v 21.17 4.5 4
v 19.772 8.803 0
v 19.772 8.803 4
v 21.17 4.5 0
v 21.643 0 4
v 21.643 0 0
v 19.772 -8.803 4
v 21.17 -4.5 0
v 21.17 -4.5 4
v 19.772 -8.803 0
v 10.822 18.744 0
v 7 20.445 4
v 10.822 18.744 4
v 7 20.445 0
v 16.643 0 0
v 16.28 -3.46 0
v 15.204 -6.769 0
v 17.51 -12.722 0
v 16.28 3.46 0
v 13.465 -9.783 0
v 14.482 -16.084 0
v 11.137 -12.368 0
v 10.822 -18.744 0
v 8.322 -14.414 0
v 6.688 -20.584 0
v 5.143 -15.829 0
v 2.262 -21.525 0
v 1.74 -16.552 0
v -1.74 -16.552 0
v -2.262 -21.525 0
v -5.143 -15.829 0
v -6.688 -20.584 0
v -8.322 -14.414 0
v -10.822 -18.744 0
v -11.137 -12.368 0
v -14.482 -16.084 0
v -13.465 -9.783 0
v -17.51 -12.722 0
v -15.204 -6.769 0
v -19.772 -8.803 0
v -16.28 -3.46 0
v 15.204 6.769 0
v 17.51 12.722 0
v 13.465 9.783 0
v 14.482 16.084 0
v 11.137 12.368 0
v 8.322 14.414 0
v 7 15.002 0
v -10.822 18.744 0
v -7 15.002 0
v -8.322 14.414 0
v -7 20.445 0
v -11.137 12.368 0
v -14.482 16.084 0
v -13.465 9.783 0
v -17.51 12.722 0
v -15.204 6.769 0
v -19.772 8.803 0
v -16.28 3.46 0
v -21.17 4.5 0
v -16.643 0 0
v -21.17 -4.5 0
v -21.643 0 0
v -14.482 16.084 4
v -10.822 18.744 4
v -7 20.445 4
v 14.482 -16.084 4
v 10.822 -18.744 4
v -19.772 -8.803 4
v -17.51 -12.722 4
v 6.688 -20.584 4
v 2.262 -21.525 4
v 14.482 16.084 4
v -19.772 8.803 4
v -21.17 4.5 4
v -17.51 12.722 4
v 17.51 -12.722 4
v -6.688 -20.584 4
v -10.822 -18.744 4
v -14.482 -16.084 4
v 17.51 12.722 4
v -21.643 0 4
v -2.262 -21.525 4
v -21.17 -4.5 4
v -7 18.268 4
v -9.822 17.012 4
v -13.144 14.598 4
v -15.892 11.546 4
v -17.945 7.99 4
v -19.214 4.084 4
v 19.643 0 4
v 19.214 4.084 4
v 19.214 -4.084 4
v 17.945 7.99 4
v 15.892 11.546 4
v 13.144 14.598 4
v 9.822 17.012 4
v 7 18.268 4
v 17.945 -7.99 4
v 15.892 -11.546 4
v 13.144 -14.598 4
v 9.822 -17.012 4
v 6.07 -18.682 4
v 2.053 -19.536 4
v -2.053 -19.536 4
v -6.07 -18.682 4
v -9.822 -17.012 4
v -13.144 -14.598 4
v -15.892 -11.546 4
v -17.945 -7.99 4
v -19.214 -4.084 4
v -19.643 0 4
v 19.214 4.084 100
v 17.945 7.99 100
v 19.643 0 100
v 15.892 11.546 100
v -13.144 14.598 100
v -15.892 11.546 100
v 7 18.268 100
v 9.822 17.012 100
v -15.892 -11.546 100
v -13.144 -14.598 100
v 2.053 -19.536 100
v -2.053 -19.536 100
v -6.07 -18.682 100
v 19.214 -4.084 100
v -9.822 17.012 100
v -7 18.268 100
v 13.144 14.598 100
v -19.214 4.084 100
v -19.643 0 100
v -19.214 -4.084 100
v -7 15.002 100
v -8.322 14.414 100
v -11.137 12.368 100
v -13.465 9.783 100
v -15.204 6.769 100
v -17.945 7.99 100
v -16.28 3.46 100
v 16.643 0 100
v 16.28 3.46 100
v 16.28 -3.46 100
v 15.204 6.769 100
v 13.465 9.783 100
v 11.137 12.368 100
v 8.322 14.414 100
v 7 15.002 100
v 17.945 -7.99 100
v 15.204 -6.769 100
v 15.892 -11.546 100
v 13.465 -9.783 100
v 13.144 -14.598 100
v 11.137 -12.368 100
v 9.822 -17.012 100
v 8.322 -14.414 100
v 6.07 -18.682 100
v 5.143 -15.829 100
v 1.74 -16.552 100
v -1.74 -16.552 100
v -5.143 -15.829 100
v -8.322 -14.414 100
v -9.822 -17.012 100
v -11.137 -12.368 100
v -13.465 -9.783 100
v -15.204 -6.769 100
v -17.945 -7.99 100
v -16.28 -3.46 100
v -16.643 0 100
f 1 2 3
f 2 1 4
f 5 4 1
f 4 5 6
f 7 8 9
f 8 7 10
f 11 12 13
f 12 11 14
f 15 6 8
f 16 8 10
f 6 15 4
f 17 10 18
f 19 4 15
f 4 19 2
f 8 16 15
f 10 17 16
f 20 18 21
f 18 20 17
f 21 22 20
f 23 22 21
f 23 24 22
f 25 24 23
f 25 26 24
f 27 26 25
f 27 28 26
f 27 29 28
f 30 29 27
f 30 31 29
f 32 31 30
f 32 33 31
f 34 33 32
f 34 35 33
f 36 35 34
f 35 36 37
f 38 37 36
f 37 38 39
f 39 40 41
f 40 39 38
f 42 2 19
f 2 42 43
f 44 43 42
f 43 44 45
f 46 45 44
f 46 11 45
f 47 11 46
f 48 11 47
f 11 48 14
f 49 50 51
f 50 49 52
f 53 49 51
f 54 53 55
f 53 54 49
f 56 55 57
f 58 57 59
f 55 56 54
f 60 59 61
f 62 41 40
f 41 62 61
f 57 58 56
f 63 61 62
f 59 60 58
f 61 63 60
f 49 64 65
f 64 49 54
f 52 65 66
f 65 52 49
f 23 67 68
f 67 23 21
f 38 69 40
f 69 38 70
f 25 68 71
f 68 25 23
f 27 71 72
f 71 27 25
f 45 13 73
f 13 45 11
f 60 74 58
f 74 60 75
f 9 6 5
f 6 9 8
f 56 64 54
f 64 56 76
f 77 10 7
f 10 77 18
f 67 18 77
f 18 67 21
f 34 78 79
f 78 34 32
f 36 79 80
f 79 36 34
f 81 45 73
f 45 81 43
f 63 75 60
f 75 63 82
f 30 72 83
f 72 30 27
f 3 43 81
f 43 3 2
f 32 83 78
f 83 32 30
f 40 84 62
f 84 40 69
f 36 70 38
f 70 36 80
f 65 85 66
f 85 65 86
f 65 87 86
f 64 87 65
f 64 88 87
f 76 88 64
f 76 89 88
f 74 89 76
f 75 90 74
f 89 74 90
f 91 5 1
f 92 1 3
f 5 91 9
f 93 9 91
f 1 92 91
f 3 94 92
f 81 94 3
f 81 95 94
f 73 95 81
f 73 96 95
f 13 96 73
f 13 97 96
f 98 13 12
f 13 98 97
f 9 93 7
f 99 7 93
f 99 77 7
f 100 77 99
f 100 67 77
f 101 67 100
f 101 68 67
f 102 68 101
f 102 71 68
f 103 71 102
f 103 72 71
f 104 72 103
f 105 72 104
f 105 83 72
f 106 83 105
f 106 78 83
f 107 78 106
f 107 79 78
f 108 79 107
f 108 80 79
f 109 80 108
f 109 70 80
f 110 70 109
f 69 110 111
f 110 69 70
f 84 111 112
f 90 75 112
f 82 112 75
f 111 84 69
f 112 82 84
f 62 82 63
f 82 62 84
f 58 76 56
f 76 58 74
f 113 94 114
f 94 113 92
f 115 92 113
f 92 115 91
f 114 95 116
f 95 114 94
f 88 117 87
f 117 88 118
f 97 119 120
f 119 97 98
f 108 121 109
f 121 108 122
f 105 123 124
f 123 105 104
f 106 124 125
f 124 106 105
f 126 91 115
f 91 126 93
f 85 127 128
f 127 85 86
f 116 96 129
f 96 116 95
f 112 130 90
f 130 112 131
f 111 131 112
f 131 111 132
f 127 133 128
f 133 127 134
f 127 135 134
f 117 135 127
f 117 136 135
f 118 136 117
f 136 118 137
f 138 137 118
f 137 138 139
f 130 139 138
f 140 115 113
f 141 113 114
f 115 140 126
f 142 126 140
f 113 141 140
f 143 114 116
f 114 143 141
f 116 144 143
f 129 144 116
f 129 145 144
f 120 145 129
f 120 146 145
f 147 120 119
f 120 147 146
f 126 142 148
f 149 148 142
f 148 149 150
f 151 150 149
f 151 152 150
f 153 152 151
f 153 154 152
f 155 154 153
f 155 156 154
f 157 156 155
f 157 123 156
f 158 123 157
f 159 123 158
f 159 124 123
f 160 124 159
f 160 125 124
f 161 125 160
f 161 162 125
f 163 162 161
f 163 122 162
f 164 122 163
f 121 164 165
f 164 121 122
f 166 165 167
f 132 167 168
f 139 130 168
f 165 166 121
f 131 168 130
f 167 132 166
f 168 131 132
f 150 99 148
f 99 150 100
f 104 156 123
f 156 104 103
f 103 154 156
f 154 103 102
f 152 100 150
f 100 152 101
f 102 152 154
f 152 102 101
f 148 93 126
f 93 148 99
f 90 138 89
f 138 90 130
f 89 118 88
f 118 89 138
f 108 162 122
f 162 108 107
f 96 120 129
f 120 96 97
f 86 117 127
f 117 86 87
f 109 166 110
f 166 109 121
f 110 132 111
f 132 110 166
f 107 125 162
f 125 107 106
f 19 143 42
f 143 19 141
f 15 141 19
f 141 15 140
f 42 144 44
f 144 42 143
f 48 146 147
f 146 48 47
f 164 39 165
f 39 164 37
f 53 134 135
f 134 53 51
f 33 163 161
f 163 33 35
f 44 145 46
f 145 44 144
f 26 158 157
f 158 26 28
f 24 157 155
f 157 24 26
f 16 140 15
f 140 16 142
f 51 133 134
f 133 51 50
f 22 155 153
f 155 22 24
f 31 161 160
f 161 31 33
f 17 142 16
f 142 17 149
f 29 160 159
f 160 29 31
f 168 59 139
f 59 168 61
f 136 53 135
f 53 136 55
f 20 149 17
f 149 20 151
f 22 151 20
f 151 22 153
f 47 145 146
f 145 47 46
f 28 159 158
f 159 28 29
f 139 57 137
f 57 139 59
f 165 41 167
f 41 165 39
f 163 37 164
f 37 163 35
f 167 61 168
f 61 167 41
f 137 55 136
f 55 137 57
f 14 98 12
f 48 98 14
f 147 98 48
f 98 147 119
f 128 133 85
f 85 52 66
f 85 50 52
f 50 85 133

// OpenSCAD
//smaller width of the stick in mm
width_a=18;
//larger width of the stick in mm
width_b=28;
//height you want your handle (height of your hand)
height=100;

////calculations////
width_c=(width_a/2)-2;
diameter=sqrt(pow(width_a,2)+pow(width_b,2));

module base(){
union(){
cylinder(d=diameter+10,h=4);
cylinder(d=diameter+6,h=height);
}}

difference(){
base();
cylinder(d=diameter,h=height);
translate([-width_c,diameter/2-3,0])cube([width_a-4,width_a-4,height]);
}


//to see how it fits on your stick un comment the following code
//cube([width_a,width_b,height],center=true);
